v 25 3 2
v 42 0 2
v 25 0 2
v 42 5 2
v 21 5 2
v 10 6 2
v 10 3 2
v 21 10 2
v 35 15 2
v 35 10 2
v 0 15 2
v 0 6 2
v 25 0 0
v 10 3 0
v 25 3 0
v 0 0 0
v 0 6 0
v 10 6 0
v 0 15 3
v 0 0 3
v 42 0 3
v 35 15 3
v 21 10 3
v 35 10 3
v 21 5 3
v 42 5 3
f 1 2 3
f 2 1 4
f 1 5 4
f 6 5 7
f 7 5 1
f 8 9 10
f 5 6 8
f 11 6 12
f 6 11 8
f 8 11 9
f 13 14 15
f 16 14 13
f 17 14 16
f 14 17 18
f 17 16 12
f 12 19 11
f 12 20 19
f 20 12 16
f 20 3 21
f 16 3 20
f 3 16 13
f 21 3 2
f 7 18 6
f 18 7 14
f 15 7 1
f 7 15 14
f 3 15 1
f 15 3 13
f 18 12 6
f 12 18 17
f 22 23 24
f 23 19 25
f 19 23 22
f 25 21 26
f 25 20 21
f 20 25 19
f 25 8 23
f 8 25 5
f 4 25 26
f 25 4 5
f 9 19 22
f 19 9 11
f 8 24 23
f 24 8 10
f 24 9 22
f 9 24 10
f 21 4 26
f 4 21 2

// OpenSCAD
translate([2.5, 1.5, 1.0]) color([0.9610312802396112, 0.18497194139743833, 0.12389516442443171]) cube([5, 3, 2], center=true);
translate([7.5, 1.5, 1.0]) color([0.21057650988664645, 0.8007465903541809, 0.9369691586445807]) cube([5, 3, 2], center=true);
translate([12.5, 1.5, 1.0]) color([0.022782575668658378, 0.42561883196681716, 0.10150021937416975]) cube([5, 3, 2], center=true);
translate([17.5, 1.5, 1.0]) color([0.259919889792832, 0.22082927131631735, 0.6469257198353225]) cube([5, 3, 2], center=true);
translate([22.5, 1.5, 1.0]) color([0.3502939673965323, 0.18031790152968785, 0.5036365052098872]) cube([5, 3, 2], center=true);
translate([2.5, 4.5, 1.0]) color([0.03937870708469238, 0.10092124118896661, 0.9882351487225011]) cube([5, 3, 2], center=true);
translate([7.5, 4.5, 1.0]) color([0.19935579046706298, 0.35855530131160185, 0.7315983062253606]) cube([5, 3, 2], center=true);
translate([3.5, 2.5, 2.5]) color([0.8383265651934163, 0.9184820619953314, 0.16942460609746768]) cube([7, 5, 1], center=true);
translate([10.5, 2.5, 2.5]) color([0.6726405635730526, 0.9665489030431832, 0.05805094382649867]) cube([7, 5, 1], center=true);
translate([17.5, 2.5, 2.5]) color([0.6762017842993783, 0.8454245937016164, 0.342312541078584]) cube([7, 5, 1], center=true);
translate([3.5, 7.5, 2.5]) color([0.25068733928511167, 0.596791393469411, 0.44231403369907896]) cube([7, 5, 1], center=true);
translate([10.5, 7.5, 2.5]) color([0.17481948445144113, 0.47162541509628797, 0.40990539565755457]) cube([7, 5, 1], center=true);
translate([17.5, 7.5, 2.5]) color([0.5691127395242802, 0.5086001300626332, 0.3114460010002068]) cube([7, 5, 1], center=true);
translate([24.5, 2.5, 2.5]) color([0.35715168259026286, 0.837661174368979, 0.25093266482213705]) cube([7, 5, 1], center=true);
translate([31.5, 2.5, 2.5]) color([0.560600218853524, 0.012436318829314397, 0.7415743774106636]) cube([7, 5, 1], center=true);
translate([3.5, 12.5, 2.5]) color([0.3359165544734606, 0.04569649356841665, 0.28088316421834825]) cube([7, 5, 1], center=true);
translate([10.5, 12.5, 2.5]) color([0.24013040782635398, 0.9531293398277989, 0.35222556151550743]) cube([7, 5, 1], center=true);
translate([17.5, 12.5, 2.5]) color([0.2878779148564, 0.35920119725374633, 0.9469058356578911]) cube([7, 5, 1], center=true);
translate([24.5, 12.5, 2.5]) color([0.6337478522492526, 0.6210768456186673, 0.7156193503014563]) cube([7, 5, 1], center=true);
translate([31.5, 12.5, 2.5]) color([0.38801723531250565, 0.4144179882772473, 0.650832862263345]) cube([7, 5, 1], center=true);
translate([38.5, 2.5, 2.5]) color([0.001524221856720187, 0.1923095412446758, 0.3344016906625016]) cube([7, 5, 1], center=true);
